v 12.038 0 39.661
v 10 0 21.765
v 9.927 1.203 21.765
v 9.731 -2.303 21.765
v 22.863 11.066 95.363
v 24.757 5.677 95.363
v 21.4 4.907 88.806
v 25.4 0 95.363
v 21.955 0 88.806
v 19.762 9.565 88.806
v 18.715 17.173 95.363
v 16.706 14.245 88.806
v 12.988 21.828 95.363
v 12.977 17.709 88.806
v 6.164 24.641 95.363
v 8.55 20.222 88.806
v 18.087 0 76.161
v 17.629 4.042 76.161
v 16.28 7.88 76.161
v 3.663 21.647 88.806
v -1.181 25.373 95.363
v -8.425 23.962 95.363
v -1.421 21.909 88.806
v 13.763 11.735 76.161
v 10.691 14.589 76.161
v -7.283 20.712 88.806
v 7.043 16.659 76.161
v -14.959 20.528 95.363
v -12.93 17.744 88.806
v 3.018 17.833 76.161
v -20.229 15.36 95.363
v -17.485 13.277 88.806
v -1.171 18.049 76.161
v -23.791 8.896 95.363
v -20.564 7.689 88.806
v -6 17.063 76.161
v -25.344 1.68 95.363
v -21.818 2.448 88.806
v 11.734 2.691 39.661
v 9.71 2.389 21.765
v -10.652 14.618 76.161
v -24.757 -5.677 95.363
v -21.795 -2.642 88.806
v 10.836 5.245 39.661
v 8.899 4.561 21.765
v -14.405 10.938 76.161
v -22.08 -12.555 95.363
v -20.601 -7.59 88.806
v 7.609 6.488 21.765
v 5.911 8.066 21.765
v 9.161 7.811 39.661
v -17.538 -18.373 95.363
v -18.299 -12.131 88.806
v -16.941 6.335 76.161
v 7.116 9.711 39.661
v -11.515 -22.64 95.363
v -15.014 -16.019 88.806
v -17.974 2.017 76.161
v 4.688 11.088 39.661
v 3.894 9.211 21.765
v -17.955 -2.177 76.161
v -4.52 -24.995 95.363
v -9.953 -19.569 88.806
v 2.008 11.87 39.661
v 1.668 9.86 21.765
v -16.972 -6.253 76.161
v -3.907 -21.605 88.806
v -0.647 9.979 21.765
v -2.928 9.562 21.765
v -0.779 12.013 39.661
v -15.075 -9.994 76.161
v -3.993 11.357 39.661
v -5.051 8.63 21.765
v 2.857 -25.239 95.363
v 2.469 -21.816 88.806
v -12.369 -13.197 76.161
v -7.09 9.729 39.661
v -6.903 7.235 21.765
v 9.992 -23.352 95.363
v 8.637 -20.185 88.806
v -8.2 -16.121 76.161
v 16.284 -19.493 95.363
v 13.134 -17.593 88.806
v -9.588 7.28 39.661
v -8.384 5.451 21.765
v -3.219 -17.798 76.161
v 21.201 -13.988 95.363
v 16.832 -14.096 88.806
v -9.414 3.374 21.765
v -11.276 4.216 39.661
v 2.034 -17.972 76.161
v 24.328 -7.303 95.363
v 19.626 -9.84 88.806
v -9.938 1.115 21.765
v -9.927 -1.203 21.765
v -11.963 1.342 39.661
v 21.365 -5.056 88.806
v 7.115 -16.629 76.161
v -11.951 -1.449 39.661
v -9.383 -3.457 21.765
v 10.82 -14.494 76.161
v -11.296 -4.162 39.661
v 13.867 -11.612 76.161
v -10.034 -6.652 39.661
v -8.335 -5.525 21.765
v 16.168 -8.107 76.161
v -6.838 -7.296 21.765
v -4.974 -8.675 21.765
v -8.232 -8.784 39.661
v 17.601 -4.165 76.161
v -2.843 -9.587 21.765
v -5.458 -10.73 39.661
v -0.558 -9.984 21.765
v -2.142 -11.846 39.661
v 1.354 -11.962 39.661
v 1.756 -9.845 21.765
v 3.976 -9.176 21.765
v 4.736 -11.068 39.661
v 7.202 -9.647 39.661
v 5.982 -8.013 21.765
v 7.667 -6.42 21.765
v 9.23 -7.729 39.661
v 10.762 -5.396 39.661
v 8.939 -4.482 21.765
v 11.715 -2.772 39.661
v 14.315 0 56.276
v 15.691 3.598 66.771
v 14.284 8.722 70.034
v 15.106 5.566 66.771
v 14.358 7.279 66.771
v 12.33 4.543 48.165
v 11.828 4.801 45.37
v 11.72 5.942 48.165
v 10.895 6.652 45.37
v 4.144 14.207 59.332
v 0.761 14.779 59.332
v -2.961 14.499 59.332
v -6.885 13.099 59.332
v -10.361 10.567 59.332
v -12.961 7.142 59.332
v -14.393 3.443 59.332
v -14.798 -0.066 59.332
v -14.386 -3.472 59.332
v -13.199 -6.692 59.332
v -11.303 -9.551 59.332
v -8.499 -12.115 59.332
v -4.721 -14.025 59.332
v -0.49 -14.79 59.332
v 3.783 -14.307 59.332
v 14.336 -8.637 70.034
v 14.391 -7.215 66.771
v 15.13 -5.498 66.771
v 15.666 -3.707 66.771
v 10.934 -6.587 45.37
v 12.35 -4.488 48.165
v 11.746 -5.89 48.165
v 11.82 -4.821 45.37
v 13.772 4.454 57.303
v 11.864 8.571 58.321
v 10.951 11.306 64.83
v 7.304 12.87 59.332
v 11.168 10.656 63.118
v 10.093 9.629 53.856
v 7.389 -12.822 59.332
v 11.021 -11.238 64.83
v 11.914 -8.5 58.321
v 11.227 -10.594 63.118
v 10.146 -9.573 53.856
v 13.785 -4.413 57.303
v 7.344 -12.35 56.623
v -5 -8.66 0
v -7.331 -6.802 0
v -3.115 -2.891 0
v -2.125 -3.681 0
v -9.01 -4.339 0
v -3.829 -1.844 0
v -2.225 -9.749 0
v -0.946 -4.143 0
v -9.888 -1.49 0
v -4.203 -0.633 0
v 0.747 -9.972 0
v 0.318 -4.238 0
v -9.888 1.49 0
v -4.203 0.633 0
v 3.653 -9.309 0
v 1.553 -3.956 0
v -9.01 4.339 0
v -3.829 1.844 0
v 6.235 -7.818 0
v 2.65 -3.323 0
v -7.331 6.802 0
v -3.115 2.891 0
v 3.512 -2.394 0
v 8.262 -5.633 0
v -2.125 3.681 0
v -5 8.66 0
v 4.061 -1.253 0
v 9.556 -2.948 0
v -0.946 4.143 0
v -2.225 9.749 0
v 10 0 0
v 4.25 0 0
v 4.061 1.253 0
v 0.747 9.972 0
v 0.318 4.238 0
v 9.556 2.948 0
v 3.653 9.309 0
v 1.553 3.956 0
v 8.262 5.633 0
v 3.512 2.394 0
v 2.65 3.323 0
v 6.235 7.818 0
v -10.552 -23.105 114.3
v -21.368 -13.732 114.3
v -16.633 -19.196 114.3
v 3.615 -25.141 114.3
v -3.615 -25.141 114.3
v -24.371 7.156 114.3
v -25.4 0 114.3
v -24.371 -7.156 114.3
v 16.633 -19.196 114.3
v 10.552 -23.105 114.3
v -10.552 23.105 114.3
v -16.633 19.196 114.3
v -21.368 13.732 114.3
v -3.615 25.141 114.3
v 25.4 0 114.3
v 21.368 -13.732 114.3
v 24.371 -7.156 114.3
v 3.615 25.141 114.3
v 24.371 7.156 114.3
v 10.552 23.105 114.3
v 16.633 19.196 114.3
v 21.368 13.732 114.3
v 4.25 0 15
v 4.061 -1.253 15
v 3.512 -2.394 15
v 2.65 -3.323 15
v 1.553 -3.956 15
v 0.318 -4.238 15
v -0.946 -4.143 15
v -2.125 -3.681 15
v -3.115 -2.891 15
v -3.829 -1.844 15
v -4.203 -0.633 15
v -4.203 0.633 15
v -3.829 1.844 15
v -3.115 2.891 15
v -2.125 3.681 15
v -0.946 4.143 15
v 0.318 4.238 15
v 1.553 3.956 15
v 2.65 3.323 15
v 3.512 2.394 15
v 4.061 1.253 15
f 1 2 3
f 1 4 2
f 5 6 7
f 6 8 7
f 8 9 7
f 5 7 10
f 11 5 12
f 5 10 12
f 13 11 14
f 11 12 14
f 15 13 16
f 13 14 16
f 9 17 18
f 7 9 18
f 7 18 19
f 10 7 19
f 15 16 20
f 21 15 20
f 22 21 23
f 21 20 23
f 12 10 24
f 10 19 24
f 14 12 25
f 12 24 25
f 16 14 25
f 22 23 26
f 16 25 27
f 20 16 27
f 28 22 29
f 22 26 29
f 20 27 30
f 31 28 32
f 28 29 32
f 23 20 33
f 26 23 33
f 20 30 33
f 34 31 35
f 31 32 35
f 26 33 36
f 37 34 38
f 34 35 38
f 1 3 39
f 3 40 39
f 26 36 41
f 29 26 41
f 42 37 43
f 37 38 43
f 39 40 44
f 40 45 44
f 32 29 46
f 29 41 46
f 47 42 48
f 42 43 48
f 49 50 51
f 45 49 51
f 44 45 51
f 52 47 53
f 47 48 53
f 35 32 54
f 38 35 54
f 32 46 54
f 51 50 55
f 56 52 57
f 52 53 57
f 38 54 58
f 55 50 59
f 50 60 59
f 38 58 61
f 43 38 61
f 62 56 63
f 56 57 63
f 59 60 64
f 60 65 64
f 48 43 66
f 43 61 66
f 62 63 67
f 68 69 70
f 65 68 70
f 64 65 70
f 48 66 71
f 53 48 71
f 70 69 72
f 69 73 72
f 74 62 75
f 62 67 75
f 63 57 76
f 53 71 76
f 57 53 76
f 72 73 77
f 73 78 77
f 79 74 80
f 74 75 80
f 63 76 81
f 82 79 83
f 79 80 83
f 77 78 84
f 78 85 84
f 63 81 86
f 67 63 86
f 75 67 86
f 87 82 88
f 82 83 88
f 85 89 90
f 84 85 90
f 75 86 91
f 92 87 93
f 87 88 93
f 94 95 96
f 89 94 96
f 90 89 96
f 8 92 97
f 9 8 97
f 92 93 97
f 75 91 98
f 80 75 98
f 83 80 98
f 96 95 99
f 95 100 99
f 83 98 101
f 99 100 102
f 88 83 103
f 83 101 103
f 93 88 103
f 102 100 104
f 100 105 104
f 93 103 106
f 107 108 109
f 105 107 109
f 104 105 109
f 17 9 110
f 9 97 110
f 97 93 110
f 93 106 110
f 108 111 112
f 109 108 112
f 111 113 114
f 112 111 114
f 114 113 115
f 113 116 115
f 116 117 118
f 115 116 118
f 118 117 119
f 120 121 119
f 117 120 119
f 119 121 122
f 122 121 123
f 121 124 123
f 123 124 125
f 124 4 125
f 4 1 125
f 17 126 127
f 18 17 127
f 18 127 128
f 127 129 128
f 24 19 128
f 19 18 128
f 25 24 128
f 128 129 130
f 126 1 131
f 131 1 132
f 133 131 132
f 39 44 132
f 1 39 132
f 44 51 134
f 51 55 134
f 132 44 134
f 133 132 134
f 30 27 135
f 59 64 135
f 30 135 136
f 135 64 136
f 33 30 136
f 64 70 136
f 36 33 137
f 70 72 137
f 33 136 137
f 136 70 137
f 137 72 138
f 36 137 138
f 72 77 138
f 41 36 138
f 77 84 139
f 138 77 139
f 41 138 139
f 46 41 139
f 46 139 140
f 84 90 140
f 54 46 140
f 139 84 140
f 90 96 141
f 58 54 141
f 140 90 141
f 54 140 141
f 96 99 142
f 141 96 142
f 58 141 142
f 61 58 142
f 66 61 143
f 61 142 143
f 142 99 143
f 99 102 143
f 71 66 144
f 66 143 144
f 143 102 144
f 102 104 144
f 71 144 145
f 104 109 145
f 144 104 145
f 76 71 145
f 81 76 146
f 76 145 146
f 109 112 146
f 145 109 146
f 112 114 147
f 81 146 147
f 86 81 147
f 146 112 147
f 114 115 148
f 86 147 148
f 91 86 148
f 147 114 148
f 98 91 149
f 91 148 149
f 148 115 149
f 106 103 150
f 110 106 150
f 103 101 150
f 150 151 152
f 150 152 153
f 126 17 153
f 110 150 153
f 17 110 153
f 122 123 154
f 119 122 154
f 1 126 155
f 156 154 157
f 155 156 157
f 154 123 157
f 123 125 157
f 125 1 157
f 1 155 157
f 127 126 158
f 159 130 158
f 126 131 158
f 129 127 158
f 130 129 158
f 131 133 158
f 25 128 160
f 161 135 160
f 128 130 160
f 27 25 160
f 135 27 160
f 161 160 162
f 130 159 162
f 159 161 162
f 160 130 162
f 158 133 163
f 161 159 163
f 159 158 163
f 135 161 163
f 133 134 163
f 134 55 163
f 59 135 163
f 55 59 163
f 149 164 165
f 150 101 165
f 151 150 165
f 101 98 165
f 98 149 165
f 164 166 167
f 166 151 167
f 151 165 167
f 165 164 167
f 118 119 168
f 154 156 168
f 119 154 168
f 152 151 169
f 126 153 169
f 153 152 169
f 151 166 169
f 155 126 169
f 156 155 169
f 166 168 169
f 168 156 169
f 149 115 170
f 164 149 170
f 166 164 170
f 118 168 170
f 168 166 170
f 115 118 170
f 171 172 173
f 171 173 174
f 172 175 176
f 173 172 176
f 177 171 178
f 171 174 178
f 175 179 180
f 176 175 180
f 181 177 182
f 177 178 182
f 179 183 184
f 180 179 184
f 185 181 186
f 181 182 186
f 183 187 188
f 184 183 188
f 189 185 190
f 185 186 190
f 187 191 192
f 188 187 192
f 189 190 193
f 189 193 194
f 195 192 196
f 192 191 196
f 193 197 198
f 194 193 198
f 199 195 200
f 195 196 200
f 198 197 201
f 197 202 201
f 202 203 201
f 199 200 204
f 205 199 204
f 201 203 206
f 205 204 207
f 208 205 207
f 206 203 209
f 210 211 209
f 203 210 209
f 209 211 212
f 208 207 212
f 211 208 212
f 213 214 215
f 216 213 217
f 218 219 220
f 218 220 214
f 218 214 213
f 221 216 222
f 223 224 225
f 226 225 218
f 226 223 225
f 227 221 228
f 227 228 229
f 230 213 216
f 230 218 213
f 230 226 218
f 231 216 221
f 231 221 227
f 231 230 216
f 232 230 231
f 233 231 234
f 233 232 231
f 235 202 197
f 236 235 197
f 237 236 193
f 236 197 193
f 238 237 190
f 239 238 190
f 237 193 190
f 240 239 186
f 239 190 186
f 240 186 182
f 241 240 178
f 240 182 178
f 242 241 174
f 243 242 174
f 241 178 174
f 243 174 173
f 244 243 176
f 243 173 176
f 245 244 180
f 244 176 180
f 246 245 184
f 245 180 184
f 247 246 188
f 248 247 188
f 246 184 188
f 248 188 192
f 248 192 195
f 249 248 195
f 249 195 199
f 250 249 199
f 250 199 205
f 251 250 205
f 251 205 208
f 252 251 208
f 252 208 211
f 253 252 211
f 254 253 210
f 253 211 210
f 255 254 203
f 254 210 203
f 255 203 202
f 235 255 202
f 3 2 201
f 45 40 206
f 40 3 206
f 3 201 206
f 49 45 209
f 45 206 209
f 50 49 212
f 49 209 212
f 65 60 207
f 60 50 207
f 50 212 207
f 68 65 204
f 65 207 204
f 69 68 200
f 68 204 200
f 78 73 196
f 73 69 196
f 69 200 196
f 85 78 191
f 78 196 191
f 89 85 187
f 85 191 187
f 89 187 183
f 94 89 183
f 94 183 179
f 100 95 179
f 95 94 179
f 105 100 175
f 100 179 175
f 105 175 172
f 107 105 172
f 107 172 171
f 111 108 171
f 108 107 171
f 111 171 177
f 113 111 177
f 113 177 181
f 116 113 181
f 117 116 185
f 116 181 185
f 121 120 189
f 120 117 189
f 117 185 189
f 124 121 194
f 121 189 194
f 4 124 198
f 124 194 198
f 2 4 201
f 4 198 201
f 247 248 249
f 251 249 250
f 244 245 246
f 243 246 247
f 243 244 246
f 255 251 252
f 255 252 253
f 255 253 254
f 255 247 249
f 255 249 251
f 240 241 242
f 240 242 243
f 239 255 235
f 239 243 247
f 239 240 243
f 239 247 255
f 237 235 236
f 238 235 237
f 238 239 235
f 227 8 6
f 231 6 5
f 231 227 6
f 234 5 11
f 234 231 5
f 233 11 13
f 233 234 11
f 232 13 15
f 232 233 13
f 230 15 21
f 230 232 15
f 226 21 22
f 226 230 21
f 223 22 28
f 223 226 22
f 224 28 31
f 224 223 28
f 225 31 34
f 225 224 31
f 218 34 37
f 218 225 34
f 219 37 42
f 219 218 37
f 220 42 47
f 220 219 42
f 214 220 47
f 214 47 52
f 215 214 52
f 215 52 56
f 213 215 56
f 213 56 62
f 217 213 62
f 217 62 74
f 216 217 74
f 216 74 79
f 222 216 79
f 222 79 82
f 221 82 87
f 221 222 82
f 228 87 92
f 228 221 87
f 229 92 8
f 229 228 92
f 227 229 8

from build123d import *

# Parameters (mm, degrees)
F0_R     = 10
F1_DEPTH = 101.6
F4_R     = 38.1
F5_DEPTH = 12.7
F6_R     = 4.25
F7_DEPTH = 15
F8_R     = 38.1
F8_R_2   = 25.4
F9_DEPTH = 25.4


with BuildPart() as f1:
    # F0 (on Top) → F1 (new body)
    with BuildSketch(Plane.XY):
        Circle(F0_R)
    extrude(amount=F1_DEPTH)

    # F2 (on Front) → F3 (revolve)
    with BuildSketch(Plane.XZ):
        with BuildLine():
            Line((0, 101.6), (0, 0))
            Line((0, 0), (7.7706216834, 0))
            add(Edge.make_bspline(
                [(38.1, 101.6), (33.7451557732, 101.056594794), (17.7116021292, 99.0558994609), (11.960024104, 41.7448789118), (7.7706216834, 0)],
                knots=[0, 0, 0, 0, 0.2716081739, 1, 1, 1, 1], degree=3))
            Line((38.1, 101.6), (0, 101.6))
        make_face()
    revolve(axis=Axis((0, 0, 50.8), (0, 0, 1)))

    # F4 (on face) → F5 (join)
    with BuildSketch(Plane.XY.offset(101.6)):
        Circle(F4_R)
    extrude(amount=F5_DEPTH)

    # F6 (on face) → F7 (cut)
    with BuildSketch(Plane(origin=(0, 0, 0), x_dir=(1, 0, 0), z_dir=(0, 0, -1))):
        Circle(F6_R)
    extrude(amount=-F7_DEPTH, mode=Mode.SUBTRACT)

    # F8 (on face) → F9 (cut)
    with BuildSketch(Plane.XY.offset(114.3)):
        Circle(F8_R)
        Circle(F8_R_2, mode=Mode.SUBTRACT)
    extrude(amount=-F9_DEPTH, mode=Mode.SUBTRACT)


solid = f1.part
